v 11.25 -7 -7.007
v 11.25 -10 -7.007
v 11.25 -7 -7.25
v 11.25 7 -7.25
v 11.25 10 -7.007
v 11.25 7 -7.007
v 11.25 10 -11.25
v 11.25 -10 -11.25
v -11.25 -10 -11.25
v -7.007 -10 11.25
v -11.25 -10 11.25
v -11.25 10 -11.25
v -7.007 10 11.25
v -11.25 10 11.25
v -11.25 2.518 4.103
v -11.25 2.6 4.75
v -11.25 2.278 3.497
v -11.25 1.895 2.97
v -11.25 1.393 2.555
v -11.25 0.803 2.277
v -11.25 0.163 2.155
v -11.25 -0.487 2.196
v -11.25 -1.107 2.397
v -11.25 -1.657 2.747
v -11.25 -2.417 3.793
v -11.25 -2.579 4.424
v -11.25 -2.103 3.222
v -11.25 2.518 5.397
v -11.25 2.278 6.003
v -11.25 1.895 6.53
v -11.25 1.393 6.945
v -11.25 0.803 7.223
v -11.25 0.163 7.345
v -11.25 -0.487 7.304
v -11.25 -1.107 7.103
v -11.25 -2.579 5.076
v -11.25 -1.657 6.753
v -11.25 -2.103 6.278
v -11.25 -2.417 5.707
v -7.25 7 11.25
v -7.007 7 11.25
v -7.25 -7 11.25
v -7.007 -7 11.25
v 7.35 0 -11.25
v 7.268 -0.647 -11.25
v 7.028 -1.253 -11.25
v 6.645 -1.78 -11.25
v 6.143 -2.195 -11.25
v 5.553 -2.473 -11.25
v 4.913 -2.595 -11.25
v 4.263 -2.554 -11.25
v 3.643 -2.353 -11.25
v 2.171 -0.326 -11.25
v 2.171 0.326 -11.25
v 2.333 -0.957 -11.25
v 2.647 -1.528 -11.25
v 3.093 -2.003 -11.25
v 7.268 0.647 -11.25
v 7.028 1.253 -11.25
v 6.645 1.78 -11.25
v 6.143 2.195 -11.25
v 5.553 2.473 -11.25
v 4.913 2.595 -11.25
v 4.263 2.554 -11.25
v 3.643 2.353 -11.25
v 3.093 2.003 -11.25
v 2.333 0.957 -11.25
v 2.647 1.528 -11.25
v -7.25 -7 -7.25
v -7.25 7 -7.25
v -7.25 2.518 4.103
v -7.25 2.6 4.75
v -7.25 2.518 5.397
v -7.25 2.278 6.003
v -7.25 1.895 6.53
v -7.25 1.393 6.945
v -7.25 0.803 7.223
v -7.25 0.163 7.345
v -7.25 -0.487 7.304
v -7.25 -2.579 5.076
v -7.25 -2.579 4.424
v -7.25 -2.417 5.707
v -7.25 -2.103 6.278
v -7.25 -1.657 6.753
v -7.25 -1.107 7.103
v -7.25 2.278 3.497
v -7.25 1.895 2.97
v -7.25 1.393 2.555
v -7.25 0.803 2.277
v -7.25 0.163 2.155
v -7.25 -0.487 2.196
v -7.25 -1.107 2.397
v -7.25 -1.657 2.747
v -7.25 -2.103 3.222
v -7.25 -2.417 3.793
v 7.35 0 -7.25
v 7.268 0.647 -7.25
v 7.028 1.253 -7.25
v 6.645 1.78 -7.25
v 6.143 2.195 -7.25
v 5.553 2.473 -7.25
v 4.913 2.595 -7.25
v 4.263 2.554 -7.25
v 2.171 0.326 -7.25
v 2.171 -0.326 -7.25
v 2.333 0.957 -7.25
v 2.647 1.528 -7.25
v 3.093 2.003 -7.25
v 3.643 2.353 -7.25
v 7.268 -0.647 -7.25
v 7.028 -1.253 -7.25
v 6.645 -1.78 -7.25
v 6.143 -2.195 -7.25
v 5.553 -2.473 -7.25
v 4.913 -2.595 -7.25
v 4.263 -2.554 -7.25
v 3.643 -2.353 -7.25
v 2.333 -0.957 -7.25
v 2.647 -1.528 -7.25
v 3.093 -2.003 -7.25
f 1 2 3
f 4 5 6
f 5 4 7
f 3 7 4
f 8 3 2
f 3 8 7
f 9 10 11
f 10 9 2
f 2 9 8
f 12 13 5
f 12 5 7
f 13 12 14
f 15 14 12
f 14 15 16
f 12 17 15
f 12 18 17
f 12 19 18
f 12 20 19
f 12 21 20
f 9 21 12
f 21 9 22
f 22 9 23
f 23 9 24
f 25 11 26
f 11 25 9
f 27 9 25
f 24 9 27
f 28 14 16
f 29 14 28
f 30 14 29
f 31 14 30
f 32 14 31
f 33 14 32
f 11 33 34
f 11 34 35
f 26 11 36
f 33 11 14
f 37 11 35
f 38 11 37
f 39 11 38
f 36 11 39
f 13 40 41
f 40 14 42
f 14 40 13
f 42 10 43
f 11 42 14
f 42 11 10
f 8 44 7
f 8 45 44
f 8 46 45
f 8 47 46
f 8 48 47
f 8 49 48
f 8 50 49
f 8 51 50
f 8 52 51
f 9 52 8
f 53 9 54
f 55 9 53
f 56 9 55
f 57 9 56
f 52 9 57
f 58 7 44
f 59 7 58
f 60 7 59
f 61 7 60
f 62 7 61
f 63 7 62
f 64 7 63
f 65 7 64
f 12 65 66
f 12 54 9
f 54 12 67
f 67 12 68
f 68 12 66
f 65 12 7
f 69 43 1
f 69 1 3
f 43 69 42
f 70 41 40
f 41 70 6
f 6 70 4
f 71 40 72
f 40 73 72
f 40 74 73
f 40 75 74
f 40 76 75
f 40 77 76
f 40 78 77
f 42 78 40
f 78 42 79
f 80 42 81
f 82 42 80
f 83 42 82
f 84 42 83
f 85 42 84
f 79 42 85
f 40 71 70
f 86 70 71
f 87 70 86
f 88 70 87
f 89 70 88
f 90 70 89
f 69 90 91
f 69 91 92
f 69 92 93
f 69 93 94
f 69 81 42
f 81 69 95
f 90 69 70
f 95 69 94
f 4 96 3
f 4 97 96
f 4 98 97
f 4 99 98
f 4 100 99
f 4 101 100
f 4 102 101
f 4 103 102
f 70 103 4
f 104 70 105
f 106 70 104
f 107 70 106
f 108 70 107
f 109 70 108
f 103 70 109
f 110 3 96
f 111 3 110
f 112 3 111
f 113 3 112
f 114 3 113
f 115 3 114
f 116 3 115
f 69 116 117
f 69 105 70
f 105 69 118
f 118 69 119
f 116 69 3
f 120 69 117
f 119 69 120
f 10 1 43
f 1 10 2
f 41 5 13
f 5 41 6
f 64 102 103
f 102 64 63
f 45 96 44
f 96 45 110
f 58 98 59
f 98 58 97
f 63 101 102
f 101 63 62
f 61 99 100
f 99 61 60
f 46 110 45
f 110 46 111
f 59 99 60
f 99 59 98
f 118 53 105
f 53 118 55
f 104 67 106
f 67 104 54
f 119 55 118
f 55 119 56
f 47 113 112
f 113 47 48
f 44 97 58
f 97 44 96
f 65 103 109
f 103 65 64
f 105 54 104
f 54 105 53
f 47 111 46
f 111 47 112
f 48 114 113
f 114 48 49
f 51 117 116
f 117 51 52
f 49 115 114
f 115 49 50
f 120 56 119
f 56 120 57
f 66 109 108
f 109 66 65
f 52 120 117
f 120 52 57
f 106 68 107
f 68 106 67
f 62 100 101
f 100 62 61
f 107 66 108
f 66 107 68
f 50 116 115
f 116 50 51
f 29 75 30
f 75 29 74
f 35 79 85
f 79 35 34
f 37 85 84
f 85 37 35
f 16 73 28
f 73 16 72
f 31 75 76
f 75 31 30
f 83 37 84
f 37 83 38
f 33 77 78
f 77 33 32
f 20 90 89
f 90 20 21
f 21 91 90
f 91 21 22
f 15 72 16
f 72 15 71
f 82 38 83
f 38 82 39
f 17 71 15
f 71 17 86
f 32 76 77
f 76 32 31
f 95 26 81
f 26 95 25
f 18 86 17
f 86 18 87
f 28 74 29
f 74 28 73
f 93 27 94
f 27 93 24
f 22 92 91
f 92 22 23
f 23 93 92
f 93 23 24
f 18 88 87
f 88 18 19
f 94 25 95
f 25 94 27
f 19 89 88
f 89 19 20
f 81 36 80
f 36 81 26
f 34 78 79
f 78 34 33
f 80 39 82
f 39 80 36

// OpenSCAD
module 90BracketMin(){

// 90 degree bracket
// modifié par X. HINAULT - www.mon-club-elec.fr
// Tous droits réservés www.mon-fablab.fr - 2017
// Licence GPLv3 - usage NON COMMERCIAL uniquement
	

$fn = 25;
length = 22.5;
width = 20;
walls = 3;

rHole = 2.6;

rotate([90, 0, 0])
difference()
{
    cube([length, length, width], center=true);
    
    translate([4, 4, 0])
    cube([length, length, width-(walls * 2)], center=true);
    
    rotate([0,0,45])
    translate([length/2 + 3, 0, 0])
    cube([length, length + 20, width+2], center= true);
    
    // bottom screw holes
    //translate([length/2 - 8, -length/2 + 5, 0])
    //rotate([90, 0, 0])
    //#cylinder(r=rHole, h=10);

    translate([-length/2 + 16, -length/2 + 5, 0])
    rotate([90, 0, 0])
    #cylinder(r=rHole, h=10);
    
    
    // side screw holes
    //translate([-length/2 - 5, length/2 - 8, 0])
    //rotate([0, 90, 0])
    //#cylinder(r=rHole, h=10);

    translate([-length/2 - 5, -length/2 + 16, 0])
    rotate([0, 90, 0])
    #cylinder(r=rHole, h=10);
}

} // fin module 

90BracketMin();
